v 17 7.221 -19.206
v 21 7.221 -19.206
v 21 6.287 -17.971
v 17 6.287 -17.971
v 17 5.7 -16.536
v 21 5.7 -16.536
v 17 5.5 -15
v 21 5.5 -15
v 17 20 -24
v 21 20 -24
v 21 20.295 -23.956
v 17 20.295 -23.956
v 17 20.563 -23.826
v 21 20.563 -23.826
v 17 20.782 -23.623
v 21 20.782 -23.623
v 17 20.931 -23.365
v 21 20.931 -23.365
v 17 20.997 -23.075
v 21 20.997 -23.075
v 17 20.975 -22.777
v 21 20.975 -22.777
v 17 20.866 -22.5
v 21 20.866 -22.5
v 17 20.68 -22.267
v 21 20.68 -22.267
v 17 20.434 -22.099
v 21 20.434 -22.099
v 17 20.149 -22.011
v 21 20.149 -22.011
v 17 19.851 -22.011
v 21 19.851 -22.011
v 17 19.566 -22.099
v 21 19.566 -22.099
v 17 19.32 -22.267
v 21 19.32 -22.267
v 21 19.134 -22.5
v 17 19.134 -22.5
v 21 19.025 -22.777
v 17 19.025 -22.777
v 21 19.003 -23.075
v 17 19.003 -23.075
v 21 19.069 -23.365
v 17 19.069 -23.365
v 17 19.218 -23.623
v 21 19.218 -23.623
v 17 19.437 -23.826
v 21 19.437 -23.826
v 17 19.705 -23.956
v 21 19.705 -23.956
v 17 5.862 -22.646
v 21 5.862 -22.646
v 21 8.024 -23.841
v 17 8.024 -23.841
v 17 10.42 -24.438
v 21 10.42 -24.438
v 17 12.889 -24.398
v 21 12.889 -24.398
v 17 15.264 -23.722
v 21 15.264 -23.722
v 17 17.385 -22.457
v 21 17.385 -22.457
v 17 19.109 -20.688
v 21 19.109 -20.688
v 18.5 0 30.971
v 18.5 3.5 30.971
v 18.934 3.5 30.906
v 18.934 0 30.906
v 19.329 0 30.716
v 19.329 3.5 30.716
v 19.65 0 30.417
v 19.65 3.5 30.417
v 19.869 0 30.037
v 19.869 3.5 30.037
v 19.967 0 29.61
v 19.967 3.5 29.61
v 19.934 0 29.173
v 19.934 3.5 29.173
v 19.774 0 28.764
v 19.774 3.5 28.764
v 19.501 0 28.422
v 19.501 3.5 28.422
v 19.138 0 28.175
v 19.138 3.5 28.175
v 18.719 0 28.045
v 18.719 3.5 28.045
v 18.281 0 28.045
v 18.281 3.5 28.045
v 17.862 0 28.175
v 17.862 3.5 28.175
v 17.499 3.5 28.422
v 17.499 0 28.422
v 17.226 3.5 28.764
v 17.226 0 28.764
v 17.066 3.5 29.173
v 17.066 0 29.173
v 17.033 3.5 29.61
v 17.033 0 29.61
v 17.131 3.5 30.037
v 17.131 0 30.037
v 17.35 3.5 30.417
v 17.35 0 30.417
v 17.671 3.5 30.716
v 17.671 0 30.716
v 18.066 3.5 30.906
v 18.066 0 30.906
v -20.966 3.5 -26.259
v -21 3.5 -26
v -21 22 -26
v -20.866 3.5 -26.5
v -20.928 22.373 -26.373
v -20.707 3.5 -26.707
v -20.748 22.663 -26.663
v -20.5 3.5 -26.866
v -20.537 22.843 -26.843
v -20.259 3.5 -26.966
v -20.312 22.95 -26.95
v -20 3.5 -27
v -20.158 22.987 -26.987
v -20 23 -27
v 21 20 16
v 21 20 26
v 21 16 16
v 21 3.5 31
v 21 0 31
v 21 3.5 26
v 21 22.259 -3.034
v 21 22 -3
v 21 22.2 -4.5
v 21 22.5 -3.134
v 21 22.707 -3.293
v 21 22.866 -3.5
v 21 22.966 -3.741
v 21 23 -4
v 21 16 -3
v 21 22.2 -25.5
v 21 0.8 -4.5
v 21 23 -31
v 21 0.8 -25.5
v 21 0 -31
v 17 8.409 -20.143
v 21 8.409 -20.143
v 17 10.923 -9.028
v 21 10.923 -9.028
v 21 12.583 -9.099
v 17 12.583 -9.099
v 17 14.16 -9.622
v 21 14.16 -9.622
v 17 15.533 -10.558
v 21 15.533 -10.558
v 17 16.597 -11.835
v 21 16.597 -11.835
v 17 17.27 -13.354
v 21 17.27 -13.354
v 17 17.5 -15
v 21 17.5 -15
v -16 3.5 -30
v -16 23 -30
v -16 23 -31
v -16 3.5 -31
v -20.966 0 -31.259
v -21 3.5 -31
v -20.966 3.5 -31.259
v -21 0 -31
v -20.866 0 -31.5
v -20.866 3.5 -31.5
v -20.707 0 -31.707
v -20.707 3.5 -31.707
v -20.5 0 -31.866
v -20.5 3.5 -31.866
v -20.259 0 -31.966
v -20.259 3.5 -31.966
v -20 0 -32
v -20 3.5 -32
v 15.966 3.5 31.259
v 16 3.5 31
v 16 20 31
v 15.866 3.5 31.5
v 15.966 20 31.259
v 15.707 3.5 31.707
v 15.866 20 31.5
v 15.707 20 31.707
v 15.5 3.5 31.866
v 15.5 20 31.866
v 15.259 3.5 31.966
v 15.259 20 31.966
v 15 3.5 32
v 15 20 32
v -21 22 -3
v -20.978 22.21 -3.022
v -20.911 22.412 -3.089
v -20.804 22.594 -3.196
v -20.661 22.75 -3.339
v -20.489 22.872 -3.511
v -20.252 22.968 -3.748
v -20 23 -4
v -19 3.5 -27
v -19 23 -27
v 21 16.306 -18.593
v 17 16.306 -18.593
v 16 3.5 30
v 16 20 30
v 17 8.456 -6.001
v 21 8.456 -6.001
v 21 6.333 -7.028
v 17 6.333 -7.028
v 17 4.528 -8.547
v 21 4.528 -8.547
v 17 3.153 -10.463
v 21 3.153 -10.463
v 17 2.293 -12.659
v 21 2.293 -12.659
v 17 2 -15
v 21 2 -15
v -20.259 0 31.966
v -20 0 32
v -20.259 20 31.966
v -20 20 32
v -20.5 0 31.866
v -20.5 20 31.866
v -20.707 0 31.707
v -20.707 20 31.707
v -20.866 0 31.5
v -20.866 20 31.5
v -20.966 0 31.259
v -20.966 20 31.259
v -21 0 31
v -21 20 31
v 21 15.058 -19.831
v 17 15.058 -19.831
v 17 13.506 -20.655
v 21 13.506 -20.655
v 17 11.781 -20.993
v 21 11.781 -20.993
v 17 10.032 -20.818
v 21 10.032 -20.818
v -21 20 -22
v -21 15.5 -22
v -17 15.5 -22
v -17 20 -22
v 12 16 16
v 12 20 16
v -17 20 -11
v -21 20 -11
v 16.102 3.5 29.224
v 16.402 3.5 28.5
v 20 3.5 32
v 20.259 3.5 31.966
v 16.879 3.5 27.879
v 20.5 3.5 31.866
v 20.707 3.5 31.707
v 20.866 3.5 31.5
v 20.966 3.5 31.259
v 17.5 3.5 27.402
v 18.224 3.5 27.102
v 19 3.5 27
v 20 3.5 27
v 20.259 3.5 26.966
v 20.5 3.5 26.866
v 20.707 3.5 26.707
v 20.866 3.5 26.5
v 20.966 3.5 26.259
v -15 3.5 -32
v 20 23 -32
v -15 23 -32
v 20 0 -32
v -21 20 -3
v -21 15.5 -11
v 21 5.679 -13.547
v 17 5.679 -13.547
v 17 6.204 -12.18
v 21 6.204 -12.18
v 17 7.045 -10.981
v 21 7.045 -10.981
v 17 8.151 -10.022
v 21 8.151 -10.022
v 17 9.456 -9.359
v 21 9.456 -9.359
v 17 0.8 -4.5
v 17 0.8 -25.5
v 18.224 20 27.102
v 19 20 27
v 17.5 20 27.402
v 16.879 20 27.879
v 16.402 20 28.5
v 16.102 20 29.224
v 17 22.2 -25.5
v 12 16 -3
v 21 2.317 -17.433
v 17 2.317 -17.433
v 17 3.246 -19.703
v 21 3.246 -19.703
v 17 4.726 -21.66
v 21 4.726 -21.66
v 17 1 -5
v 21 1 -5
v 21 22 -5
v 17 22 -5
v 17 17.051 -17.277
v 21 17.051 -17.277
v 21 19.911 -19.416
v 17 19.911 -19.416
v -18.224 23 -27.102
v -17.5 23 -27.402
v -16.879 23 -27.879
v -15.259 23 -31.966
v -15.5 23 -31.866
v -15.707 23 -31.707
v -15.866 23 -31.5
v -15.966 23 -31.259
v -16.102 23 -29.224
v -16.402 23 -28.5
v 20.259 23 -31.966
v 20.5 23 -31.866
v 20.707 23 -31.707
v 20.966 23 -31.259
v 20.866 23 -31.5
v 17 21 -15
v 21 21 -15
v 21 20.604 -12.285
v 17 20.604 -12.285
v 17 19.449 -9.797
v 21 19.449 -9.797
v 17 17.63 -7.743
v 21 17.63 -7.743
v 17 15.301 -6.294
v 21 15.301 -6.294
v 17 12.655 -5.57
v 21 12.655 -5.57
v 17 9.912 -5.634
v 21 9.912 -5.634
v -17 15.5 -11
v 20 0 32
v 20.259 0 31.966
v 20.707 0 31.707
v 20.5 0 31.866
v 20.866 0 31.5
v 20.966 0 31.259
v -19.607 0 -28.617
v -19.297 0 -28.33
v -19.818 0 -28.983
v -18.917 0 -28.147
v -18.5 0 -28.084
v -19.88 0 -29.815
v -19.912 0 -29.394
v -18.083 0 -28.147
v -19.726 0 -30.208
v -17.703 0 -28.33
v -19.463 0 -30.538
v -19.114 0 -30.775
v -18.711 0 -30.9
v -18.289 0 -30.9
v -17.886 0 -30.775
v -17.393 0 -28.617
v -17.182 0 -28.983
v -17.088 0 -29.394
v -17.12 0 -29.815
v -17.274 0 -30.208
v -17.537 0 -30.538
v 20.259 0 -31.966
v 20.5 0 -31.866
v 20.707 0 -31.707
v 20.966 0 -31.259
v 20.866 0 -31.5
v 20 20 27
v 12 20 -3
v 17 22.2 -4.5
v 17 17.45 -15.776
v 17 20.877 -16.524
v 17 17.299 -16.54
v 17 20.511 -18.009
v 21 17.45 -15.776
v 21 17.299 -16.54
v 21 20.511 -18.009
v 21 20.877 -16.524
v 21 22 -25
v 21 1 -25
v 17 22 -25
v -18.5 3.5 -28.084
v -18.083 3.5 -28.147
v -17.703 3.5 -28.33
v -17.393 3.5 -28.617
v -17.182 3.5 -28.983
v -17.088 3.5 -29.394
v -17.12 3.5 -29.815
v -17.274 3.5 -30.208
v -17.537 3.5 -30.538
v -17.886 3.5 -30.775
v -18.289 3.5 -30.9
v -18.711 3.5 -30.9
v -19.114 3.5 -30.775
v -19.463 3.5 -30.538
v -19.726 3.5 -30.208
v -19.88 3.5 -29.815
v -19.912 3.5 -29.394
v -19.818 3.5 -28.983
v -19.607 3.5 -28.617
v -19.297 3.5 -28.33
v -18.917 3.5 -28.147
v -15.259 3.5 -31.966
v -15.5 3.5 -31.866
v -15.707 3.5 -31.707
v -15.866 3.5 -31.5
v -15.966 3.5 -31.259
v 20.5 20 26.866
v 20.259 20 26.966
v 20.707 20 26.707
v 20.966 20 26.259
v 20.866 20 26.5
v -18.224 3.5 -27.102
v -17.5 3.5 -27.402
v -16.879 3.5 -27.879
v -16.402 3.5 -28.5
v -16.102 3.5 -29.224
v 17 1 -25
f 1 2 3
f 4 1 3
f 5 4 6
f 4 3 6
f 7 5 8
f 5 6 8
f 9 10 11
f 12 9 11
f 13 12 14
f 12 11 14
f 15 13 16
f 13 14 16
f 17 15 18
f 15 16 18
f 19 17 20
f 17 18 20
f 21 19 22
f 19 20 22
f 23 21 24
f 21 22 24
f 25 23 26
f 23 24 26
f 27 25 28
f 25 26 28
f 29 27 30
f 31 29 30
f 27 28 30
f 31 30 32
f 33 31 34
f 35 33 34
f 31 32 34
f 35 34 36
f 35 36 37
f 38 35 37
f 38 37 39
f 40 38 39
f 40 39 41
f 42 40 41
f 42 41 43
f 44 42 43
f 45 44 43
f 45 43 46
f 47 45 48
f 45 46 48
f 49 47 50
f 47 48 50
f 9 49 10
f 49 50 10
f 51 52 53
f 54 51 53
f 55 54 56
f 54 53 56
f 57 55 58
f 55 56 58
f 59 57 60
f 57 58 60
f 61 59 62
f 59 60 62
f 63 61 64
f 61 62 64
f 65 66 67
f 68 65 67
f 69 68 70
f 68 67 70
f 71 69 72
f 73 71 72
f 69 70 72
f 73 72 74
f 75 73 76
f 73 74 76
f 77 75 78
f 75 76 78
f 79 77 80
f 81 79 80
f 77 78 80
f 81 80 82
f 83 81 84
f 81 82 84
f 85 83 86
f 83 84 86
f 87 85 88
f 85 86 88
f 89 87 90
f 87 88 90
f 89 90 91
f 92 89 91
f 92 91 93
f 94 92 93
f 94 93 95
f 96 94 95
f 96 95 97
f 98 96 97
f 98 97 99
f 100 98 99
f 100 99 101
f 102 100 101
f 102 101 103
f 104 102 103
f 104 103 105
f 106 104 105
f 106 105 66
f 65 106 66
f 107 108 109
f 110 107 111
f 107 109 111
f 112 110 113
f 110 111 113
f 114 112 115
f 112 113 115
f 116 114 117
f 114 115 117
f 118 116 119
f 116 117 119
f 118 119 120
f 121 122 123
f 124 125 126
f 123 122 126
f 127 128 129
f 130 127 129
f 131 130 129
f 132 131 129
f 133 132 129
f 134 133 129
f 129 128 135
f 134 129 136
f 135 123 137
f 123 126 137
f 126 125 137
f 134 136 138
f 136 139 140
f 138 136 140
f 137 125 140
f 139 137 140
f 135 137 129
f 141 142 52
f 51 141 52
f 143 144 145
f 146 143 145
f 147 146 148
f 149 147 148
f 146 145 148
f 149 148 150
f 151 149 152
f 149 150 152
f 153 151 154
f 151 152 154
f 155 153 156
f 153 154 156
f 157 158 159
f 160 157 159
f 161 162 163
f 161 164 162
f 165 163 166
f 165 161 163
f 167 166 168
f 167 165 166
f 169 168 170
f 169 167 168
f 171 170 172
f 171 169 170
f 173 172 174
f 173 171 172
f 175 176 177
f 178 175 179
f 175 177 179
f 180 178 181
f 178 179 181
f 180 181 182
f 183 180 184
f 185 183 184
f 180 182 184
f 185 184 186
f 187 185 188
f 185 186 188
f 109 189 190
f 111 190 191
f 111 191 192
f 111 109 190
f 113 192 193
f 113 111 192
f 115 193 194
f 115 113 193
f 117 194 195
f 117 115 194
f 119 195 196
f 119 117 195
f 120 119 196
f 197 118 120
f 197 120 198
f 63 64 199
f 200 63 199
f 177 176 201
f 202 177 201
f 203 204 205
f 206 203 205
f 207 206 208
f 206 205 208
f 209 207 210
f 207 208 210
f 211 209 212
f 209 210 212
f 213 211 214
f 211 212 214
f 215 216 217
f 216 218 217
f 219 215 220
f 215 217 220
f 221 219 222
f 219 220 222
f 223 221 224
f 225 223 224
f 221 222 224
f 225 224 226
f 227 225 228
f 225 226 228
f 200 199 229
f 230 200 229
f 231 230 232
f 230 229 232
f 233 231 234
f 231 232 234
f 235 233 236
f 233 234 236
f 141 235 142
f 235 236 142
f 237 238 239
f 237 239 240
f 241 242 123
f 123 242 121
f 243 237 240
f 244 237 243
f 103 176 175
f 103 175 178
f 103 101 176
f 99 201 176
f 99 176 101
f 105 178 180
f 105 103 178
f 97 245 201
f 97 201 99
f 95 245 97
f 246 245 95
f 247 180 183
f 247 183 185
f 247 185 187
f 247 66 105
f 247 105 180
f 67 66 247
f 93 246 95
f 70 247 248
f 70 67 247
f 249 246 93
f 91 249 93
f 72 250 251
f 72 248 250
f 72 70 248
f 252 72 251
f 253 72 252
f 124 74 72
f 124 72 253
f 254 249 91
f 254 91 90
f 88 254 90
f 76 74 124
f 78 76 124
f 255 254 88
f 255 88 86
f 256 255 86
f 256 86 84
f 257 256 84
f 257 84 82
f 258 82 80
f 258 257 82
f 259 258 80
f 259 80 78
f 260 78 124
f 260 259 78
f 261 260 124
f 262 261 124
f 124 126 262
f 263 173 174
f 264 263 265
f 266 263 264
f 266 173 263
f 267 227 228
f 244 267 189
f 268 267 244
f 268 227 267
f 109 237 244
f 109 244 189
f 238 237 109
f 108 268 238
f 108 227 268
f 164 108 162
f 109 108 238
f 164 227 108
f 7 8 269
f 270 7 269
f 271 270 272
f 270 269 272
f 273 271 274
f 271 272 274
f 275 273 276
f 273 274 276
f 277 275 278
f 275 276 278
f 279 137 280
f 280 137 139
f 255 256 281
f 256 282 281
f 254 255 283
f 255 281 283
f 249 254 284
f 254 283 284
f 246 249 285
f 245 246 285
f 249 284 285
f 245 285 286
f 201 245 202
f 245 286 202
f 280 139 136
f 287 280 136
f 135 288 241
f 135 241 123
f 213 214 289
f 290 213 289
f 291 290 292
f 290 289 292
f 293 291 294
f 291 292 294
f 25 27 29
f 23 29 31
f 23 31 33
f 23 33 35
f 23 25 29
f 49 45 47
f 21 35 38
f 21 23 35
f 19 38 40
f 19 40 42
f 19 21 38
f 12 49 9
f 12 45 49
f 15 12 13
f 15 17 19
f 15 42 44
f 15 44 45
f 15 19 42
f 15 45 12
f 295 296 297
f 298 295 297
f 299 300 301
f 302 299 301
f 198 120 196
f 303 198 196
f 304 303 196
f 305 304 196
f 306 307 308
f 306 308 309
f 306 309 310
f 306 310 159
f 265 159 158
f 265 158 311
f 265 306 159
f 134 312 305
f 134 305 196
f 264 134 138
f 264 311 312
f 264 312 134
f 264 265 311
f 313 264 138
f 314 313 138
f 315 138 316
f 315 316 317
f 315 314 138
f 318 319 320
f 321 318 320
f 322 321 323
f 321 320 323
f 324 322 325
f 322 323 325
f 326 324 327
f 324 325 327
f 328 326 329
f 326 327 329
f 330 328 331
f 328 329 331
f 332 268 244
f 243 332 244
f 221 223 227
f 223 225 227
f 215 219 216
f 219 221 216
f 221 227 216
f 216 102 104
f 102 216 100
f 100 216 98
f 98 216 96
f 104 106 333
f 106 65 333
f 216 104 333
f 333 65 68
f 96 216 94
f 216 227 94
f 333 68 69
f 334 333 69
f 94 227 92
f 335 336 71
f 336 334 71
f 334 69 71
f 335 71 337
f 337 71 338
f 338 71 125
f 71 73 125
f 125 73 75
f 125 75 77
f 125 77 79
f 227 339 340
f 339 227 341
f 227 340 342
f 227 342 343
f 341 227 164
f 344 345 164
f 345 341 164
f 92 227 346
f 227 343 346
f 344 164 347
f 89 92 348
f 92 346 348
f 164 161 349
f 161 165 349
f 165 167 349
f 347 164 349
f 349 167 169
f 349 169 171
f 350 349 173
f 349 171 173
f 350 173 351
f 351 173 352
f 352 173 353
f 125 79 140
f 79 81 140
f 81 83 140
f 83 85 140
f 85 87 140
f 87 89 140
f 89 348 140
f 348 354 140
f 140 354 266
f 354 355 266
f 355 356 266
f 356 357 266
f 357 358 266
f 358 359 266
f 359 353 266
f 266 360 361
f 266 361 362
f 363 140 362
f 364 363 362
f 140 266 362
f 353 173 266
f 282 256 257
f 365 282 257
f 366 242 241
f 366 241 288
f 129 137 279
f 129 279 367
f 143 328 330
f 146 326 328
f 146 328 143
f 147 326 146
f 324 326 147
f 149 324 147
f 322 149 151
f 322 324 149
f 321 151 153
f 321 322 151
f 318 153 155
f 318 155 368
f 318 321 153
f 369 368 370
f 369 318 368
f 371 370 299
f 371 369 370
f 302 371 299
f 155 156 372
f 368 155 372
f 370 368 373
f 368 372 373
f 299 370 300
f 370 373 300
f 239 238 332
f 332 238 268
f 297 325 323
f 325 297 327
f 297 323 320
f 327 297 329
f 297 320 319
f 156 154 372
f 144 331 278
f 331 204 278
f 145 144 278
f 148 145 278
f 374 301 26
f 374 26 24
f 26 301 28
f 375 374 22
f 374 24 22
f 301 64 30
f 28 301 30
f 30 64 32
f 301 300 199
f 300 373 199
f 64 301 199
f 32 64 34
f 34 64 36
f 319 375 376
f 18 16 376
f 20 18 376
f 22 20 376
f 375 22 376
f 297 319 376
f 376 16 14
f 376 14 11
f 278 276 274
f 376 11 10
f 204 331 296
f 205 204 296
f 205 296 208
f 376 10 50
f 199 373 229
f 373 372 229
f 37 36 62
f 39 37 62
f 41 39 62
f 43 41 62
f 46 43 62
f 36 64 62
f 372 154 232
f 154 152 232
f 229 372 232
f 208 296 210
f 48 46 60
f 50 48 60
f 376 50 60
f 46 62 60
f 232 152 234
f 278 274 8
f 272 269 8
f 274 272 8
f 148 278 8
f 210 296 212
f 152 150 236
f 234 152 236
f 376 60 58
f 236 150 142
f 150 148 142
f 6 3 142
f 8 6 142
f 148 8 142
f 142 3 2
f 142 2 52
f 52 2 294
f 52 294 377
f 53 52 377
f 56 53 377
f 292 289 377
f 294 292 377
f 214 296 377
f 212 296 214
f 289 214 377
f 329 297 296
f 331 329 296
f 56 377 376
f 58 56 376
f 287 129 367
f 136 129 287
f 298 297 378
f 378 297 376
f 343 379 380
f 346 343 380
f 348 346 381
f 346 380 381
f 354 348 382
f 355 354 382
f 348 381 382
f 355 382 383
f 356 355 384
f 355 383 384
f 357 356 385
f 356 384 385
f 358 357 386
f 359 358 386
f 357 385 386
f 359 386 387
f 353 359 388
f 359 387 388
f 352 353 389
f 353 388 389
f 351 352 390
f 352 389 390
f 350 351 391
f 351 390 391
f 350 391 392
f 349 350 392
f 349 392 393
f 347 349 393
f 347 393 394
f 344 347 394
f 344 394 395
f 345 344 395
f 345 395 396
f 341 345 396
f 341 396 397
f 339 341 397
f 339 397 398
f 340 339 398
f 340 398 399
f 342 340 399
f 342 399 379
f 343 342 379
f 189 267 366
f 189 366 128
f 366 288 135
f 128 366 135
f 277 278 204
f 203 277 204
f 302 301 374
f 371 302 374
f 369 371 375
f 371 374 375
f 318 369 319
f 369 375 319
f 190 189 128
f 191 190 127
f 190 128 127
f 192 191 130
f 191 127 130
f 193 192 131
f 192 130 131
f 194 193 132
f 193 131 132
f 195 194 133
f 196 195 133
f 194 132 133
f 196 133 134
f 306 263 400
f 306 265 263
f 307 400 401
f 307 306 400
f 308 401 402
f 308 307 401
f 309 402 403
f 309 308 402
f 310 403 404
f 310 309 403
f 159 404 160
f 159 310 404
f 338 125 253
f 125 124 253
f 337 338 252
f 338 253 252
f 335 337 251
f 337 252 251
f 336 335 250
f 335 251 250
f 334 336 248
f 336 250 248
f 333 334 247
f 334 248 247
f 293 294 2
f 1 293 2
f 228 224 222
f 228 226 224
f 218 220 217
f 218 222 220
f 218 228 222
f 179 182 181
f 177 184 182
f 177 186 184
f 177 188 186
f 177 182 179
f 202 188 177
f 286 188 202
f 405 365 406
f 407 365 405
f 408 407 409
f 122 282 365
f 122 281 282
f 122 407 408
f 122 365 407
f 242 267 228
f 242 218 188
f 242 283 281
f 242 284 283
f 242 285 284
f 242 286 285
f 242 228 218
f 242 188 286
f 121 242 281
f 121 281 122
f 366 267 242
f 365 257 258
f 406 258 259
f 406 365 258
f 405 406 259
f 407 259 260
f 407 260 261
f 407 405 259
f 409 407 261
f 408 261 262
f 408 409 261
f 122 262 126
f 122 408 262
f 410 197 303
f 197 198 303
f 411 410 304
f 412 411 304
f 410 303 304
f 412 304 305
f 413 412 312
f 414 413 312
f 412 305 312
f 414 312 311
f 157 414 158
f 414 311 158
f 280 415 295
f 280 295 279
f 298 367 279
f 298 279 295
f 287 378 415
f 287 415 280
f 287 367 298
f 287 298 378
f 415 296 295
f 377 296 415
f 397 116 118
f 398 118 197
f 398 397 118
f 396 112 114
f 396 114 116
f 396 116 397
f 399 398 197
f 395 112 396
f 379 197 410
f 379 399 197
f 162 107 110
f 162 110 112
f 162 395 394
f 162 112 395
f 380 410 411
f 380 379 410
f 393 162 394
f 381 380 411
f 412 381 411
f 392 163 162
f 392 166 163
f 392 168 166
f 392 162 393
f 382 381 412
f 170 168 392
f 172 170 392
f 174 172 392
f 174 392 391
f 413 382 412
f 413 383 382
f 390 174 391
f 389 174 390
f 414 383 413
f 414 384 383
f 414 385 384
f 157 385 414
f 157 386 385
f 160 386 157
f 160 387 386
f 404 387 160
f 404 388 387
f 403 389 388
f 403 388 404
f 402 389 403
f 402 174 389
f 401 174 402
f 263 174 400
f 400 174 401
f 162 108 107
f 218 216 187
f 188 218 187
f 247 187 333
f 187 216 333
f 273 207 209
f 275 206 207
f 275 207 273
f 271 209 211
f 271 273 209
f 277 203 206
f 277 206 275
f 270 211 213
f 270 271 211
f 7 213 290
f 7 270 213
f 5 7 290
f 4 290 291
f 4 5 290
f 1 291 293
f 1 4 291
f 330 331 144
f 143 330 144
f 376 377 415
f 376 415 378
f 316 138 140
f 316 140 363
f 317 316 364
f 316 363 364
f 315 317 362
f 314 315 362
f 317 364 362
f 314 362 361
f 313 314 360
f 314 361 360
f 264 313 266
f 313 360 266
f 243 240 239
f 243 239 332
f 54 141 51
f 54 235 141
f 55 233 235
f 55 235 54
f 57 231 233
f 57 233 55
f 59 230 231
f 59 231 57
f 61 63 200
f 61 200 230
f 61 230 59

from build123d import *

# Parameters (mm, degrees)
SKETCH1_W           = 42
SKETCH1_H           = 64
BOSS_EXTRUDE1_DEPTH = 20
SKETCH4_W           = 42
SKETCH4_H           = 29
BOSS_EXTRUDE2_DEPTH = 3
SKETCH5_W           = 9
SKETCH5_H           = 19
CUT_EXTRUDE1_DEPTH  = 4
CUT_EXTRUDE2_REACH  = 50.154
CUT_EXTRUDE2_START  = 3.5
SKETCH6_W           = 5
SKETCH6_H           = 5
FILLET1_R           = 3
FILLET2_R           = 1
SKETCH7_R           = 1.471142405
SKETCH7_R_2         = 1.415504474
CUT_EXTRUDE3_DEPTH  = 43.956373217
SKETCH8_W           = 21
SKETCH8_H           = 21.4
SKETCH8_W_2         = 20
SKETCH8_H_2         = 21
SKETCH8_R           = 1
CUT_EXTRUDE5_DEPTH  = 4
SKETCH10_W          = 11
SKETCH10_H          = 4.5
CUT_EXTRUDE6_DEPTH  = 4


with BuildPart() as part:
    # Sketch1 → Boss-Extrude1 (new body)
    with BuildSketch(Plane(origin=(0, 0, 0), x_dir=(1, 0, 0), z_dir=(0, 1, 0))):
        Rectangle(SKETCH1_W, SKETCH1_H)
    extrude(amount=BOSS_EXTRUDE1_DEPTH)

    # Sketch4 → Boss-Extrude2 (add)
    with BuildSketch(Plane(origin=(0, 20, 0), x_dir=(1, 0, 0), z_dir=(0, 1, 0))):
        with Locations((0, 17.5)):
            Rectangle(SKETCH4_W, SKETCH4_H)
    extrude(amount=BOSS_EXTRUDE2_DEPTH)

    # Sketch5 → Cut-Extrude1 (cut)
    with BuildSketch(Plane(origin=(0, 20, 0), x_dir=(1, 0, 0), z_dir=(0, 1, 0))):
        with Locations((16.5, -6.5)):
            Rectangle(SKETCH5_W, SKETCH5_H)
    extrude(amount=-CUT_EXTRUDE1_DEPTH, mode=Mode.SUBTRACT)

    # Sketch6 → Cut-Extrude2 (cut, up to next)
    with BuildSketch(Plane(origin=(0, 0, 0), x_dir=(1, 0, 0), z_dir=(0, 1, 0)).offset(CUT_EXTRUDE2_START), mode=Mode.PRIVATE) as cut_extrude2_sk1:
        with Locations((-18.5, 29.5)):
            Rectangle(SKETCH6_W, SKETCH6_H)
    cut_extrude2_tool1 = extrude(cut_extrude2_sk1.sketch, amount=CUT_EXTRUDE2_REACH, mode=Mode.PRIVATE) & part.part
    # Sketch6 → Cut-Extrude2 (cut, up to next)
    with BuildSketch(Plane(origin=(0, 0, 0), x_dir=(1, 0, 0), z_dir=(0, 1, 0)).offset(CUT_EXTRUDE2_START), mode=Mode.PRIVATE) as cut_extrude2_sk2:
        with Locations((18.5, -29.5)):
            Rectangle(SKETCH6_W, SKETCH6_H)
    cut_extrude2_tool2 = extrude(cut_extrude2_sk2.sketch, amount=CUT_EXTRUDE2_REACH, mode=Mode.PRIVATE) & part.part
    add(cut_extrude2_tool1.solids().sort_by_distance((-18.5, 3.5, -29.5))[0], mode=Mode.SUBTRACT)
    add(cut_extrude2_tool2.solids().sort_by_distance((18.5, 3.5, 29.5))[0], mode=Mode.SUBTRACT)

    # Fillet1
    fillet1_edges = [part.edges().sort_by_distance(p)[0] for p in [
        (-16, 13.25, -27),
        (16, 11.75, 27),
    ]]
    fillet(fillet1_edges, radius=FILLET1_R)

    # Fillet2
    fillet2_edges = [part.edges().sort_by_distance(p)[0] for p in [
        (21, 1.75, 32),
        (-21, 1.75, -32),
        (-21, 13.25, -27),
        (-16, 13.25, -32),
        (21, 11.5, -32),
        (-21, 10, 32),
        (16, 11.75, 32),
        (21, 11.75, 27),
        (0, 23, -3),
        (-21, 23, -15),
    ]]
    fillet(fillet2_edges, radius=FILLET2_R)

    # Sketch7 → Cut-Extrude3 (cut, through all)
    with BuildSketch(Plane(origin=(0, 3.5, 0), x_dir=(1, 0, 0), z_dir=(0, 1, 0))):
        with Locations(Location((18.5, -29.5, 0), (0, 0, 270))):
            Circle(SKETCH7_R)
        with Locations(Location((-18.5, 29.5, 0), (0, 0, 270))):
            Circle(SKETCH7_R_2)
    extrude(amount=-CUT_EXTRUDE3_DEPTH, mode=Mode.SUBTRACT)

    # Sketch8 → Cut-Extrude5 (cut)
    # profile 1 of 7: a face of its own
    with BuildSketch(Plane(origin=(21, 0, 0), x_dir=(0, 0, -1), z_dir=(1, 0, 0))):
        with Locations((15, 11.5)):
            Rectangle(SKETCH8_W, SKETCH8_H)
        with Locations((15, 11.5)):
            Rectangle(SKETCH8_W_2, SKETCH8_H_2, mode=Mode.SUBTRACT)
    # profile 2 of 7: a face of its own
    with BuildSketch(Plane(origin=(21, 0, 0), x_dir=(0, 0, -1), z_dir=(1, 0, 0))):
        with Locations((23, 20)):
            Circle(SKETCH8_R)
    # profile 3 of 7: a face of its own
    with BuildSketch(Plane(origin=(21, 0, 0), x_dir=(0, 0, -1), z_dir=(1, 0, 0))):
        with BuildLine():
            ThreePointArc((19.415599916, 19.911449184), (17.273898937, 20.723848634), (15, 21))
            Line((15, 21), (15, 17.5))
            ThreePointArc((15, 17.5), (16.160499883, 17.386700266), (17.277171656, 17.051080008))
            Line((17.277171656, 17.051080008), (19.415599916, 19.911449184))
        make_face()
    # profile 4 of 7: a face of its own
    with BuildSketch(Plane(origin=(21, 0, 0), x_dir=(0, 0, -1), z_dir=(1, 0, 0))):
        with BuildLine():
            Line((15, 17.5), (15, 21))
            ThreePointArc((15, 21), (7.742797617, 17.63049864), (5.633627508, 9.912213384))
            Line((5.633627508, 9.912213384), (9.02780956, 10.922989297))
            ThreePointArc((9.02780956, 10.922989297), (10.558037359, 15.533480865), (15, 17.5))
        make_face()
    # profile 5 of 7: a face of its own
    with BuildSketch(Plane(origin=(21, 0, 0), x_dir=(0, 0, -1), z_dir=(1, 0, 0))):
        with BuildLine():
            ThreePointArc((6.000737249, 8.456437952), (9.462123126, 3.781067449), (15, 2))
            Line((15, 2), (15, 5.5))
            ThreePointArc((15, 5.5), (11.554812633, 6.587700741), (9.358736217, 9.456438665))
            Line((9.358736217, 9.456438665), (6.000737249, 8.456437952))
        make_face()
    # profile 6 of 7: a face of its own
    with BuildSketch(Plane(origin=(21, 0, 0), x_dir=(0, 0, -1), z_dir=(1, 0, 0))):
        with BuildLine():
            Line((15, 5.5), (15, 2))
            ThreePointArc((15, 2), (18.598182651, 2.707782896), (21.660211168, 4.725667029))
            Line((21.660211168, 4.725667029), (19.206449159, 7.221473913))
            ThreePointArc((19.206449159, 7.221473913), (17.272536411, 5.947020776), (15, 5.5))
        make_face()
    # profile 7 of 7: a face of its own
    with BuildSketch(Plane(origin=(21, 0, 0), x_dir=(0, 0, -1), z_dir=(1, 0, 0))):
        with BuildLine():
            Line((20.142508406, 8.40894722), (22.646296664, 5.862256894))
            ThreePointArc((22.646296664, 5.862256894), (24.397892993, 12.889103053), (20.688333963, 19.108735554))
            Line((20.688333963, 19.108735554), (18.592631977, 16.305517192))
            ThreePointArc((18.592631977, 16.305517192), (20.887667085, 12.655584827), (20.142508406, 8.40894722))
        make_face()
    extrude(amount=-CUT_EXTRUDE5_DEPTH, mode=Mode.SUBTRACT)

    # Sketch10 → Cut-Extrude6 (cut)
    with BuildSketch(Plane.ZY.offset(21)):
        with Locations((-16.5, 17.75)):
            Rectangle(SKETCH10_W, SKETCH10_H)
    extrude(amount=-CUT_EXTRUDE6_DEPTH, mode=Mode.SUBTRACT)


solid = part.part
